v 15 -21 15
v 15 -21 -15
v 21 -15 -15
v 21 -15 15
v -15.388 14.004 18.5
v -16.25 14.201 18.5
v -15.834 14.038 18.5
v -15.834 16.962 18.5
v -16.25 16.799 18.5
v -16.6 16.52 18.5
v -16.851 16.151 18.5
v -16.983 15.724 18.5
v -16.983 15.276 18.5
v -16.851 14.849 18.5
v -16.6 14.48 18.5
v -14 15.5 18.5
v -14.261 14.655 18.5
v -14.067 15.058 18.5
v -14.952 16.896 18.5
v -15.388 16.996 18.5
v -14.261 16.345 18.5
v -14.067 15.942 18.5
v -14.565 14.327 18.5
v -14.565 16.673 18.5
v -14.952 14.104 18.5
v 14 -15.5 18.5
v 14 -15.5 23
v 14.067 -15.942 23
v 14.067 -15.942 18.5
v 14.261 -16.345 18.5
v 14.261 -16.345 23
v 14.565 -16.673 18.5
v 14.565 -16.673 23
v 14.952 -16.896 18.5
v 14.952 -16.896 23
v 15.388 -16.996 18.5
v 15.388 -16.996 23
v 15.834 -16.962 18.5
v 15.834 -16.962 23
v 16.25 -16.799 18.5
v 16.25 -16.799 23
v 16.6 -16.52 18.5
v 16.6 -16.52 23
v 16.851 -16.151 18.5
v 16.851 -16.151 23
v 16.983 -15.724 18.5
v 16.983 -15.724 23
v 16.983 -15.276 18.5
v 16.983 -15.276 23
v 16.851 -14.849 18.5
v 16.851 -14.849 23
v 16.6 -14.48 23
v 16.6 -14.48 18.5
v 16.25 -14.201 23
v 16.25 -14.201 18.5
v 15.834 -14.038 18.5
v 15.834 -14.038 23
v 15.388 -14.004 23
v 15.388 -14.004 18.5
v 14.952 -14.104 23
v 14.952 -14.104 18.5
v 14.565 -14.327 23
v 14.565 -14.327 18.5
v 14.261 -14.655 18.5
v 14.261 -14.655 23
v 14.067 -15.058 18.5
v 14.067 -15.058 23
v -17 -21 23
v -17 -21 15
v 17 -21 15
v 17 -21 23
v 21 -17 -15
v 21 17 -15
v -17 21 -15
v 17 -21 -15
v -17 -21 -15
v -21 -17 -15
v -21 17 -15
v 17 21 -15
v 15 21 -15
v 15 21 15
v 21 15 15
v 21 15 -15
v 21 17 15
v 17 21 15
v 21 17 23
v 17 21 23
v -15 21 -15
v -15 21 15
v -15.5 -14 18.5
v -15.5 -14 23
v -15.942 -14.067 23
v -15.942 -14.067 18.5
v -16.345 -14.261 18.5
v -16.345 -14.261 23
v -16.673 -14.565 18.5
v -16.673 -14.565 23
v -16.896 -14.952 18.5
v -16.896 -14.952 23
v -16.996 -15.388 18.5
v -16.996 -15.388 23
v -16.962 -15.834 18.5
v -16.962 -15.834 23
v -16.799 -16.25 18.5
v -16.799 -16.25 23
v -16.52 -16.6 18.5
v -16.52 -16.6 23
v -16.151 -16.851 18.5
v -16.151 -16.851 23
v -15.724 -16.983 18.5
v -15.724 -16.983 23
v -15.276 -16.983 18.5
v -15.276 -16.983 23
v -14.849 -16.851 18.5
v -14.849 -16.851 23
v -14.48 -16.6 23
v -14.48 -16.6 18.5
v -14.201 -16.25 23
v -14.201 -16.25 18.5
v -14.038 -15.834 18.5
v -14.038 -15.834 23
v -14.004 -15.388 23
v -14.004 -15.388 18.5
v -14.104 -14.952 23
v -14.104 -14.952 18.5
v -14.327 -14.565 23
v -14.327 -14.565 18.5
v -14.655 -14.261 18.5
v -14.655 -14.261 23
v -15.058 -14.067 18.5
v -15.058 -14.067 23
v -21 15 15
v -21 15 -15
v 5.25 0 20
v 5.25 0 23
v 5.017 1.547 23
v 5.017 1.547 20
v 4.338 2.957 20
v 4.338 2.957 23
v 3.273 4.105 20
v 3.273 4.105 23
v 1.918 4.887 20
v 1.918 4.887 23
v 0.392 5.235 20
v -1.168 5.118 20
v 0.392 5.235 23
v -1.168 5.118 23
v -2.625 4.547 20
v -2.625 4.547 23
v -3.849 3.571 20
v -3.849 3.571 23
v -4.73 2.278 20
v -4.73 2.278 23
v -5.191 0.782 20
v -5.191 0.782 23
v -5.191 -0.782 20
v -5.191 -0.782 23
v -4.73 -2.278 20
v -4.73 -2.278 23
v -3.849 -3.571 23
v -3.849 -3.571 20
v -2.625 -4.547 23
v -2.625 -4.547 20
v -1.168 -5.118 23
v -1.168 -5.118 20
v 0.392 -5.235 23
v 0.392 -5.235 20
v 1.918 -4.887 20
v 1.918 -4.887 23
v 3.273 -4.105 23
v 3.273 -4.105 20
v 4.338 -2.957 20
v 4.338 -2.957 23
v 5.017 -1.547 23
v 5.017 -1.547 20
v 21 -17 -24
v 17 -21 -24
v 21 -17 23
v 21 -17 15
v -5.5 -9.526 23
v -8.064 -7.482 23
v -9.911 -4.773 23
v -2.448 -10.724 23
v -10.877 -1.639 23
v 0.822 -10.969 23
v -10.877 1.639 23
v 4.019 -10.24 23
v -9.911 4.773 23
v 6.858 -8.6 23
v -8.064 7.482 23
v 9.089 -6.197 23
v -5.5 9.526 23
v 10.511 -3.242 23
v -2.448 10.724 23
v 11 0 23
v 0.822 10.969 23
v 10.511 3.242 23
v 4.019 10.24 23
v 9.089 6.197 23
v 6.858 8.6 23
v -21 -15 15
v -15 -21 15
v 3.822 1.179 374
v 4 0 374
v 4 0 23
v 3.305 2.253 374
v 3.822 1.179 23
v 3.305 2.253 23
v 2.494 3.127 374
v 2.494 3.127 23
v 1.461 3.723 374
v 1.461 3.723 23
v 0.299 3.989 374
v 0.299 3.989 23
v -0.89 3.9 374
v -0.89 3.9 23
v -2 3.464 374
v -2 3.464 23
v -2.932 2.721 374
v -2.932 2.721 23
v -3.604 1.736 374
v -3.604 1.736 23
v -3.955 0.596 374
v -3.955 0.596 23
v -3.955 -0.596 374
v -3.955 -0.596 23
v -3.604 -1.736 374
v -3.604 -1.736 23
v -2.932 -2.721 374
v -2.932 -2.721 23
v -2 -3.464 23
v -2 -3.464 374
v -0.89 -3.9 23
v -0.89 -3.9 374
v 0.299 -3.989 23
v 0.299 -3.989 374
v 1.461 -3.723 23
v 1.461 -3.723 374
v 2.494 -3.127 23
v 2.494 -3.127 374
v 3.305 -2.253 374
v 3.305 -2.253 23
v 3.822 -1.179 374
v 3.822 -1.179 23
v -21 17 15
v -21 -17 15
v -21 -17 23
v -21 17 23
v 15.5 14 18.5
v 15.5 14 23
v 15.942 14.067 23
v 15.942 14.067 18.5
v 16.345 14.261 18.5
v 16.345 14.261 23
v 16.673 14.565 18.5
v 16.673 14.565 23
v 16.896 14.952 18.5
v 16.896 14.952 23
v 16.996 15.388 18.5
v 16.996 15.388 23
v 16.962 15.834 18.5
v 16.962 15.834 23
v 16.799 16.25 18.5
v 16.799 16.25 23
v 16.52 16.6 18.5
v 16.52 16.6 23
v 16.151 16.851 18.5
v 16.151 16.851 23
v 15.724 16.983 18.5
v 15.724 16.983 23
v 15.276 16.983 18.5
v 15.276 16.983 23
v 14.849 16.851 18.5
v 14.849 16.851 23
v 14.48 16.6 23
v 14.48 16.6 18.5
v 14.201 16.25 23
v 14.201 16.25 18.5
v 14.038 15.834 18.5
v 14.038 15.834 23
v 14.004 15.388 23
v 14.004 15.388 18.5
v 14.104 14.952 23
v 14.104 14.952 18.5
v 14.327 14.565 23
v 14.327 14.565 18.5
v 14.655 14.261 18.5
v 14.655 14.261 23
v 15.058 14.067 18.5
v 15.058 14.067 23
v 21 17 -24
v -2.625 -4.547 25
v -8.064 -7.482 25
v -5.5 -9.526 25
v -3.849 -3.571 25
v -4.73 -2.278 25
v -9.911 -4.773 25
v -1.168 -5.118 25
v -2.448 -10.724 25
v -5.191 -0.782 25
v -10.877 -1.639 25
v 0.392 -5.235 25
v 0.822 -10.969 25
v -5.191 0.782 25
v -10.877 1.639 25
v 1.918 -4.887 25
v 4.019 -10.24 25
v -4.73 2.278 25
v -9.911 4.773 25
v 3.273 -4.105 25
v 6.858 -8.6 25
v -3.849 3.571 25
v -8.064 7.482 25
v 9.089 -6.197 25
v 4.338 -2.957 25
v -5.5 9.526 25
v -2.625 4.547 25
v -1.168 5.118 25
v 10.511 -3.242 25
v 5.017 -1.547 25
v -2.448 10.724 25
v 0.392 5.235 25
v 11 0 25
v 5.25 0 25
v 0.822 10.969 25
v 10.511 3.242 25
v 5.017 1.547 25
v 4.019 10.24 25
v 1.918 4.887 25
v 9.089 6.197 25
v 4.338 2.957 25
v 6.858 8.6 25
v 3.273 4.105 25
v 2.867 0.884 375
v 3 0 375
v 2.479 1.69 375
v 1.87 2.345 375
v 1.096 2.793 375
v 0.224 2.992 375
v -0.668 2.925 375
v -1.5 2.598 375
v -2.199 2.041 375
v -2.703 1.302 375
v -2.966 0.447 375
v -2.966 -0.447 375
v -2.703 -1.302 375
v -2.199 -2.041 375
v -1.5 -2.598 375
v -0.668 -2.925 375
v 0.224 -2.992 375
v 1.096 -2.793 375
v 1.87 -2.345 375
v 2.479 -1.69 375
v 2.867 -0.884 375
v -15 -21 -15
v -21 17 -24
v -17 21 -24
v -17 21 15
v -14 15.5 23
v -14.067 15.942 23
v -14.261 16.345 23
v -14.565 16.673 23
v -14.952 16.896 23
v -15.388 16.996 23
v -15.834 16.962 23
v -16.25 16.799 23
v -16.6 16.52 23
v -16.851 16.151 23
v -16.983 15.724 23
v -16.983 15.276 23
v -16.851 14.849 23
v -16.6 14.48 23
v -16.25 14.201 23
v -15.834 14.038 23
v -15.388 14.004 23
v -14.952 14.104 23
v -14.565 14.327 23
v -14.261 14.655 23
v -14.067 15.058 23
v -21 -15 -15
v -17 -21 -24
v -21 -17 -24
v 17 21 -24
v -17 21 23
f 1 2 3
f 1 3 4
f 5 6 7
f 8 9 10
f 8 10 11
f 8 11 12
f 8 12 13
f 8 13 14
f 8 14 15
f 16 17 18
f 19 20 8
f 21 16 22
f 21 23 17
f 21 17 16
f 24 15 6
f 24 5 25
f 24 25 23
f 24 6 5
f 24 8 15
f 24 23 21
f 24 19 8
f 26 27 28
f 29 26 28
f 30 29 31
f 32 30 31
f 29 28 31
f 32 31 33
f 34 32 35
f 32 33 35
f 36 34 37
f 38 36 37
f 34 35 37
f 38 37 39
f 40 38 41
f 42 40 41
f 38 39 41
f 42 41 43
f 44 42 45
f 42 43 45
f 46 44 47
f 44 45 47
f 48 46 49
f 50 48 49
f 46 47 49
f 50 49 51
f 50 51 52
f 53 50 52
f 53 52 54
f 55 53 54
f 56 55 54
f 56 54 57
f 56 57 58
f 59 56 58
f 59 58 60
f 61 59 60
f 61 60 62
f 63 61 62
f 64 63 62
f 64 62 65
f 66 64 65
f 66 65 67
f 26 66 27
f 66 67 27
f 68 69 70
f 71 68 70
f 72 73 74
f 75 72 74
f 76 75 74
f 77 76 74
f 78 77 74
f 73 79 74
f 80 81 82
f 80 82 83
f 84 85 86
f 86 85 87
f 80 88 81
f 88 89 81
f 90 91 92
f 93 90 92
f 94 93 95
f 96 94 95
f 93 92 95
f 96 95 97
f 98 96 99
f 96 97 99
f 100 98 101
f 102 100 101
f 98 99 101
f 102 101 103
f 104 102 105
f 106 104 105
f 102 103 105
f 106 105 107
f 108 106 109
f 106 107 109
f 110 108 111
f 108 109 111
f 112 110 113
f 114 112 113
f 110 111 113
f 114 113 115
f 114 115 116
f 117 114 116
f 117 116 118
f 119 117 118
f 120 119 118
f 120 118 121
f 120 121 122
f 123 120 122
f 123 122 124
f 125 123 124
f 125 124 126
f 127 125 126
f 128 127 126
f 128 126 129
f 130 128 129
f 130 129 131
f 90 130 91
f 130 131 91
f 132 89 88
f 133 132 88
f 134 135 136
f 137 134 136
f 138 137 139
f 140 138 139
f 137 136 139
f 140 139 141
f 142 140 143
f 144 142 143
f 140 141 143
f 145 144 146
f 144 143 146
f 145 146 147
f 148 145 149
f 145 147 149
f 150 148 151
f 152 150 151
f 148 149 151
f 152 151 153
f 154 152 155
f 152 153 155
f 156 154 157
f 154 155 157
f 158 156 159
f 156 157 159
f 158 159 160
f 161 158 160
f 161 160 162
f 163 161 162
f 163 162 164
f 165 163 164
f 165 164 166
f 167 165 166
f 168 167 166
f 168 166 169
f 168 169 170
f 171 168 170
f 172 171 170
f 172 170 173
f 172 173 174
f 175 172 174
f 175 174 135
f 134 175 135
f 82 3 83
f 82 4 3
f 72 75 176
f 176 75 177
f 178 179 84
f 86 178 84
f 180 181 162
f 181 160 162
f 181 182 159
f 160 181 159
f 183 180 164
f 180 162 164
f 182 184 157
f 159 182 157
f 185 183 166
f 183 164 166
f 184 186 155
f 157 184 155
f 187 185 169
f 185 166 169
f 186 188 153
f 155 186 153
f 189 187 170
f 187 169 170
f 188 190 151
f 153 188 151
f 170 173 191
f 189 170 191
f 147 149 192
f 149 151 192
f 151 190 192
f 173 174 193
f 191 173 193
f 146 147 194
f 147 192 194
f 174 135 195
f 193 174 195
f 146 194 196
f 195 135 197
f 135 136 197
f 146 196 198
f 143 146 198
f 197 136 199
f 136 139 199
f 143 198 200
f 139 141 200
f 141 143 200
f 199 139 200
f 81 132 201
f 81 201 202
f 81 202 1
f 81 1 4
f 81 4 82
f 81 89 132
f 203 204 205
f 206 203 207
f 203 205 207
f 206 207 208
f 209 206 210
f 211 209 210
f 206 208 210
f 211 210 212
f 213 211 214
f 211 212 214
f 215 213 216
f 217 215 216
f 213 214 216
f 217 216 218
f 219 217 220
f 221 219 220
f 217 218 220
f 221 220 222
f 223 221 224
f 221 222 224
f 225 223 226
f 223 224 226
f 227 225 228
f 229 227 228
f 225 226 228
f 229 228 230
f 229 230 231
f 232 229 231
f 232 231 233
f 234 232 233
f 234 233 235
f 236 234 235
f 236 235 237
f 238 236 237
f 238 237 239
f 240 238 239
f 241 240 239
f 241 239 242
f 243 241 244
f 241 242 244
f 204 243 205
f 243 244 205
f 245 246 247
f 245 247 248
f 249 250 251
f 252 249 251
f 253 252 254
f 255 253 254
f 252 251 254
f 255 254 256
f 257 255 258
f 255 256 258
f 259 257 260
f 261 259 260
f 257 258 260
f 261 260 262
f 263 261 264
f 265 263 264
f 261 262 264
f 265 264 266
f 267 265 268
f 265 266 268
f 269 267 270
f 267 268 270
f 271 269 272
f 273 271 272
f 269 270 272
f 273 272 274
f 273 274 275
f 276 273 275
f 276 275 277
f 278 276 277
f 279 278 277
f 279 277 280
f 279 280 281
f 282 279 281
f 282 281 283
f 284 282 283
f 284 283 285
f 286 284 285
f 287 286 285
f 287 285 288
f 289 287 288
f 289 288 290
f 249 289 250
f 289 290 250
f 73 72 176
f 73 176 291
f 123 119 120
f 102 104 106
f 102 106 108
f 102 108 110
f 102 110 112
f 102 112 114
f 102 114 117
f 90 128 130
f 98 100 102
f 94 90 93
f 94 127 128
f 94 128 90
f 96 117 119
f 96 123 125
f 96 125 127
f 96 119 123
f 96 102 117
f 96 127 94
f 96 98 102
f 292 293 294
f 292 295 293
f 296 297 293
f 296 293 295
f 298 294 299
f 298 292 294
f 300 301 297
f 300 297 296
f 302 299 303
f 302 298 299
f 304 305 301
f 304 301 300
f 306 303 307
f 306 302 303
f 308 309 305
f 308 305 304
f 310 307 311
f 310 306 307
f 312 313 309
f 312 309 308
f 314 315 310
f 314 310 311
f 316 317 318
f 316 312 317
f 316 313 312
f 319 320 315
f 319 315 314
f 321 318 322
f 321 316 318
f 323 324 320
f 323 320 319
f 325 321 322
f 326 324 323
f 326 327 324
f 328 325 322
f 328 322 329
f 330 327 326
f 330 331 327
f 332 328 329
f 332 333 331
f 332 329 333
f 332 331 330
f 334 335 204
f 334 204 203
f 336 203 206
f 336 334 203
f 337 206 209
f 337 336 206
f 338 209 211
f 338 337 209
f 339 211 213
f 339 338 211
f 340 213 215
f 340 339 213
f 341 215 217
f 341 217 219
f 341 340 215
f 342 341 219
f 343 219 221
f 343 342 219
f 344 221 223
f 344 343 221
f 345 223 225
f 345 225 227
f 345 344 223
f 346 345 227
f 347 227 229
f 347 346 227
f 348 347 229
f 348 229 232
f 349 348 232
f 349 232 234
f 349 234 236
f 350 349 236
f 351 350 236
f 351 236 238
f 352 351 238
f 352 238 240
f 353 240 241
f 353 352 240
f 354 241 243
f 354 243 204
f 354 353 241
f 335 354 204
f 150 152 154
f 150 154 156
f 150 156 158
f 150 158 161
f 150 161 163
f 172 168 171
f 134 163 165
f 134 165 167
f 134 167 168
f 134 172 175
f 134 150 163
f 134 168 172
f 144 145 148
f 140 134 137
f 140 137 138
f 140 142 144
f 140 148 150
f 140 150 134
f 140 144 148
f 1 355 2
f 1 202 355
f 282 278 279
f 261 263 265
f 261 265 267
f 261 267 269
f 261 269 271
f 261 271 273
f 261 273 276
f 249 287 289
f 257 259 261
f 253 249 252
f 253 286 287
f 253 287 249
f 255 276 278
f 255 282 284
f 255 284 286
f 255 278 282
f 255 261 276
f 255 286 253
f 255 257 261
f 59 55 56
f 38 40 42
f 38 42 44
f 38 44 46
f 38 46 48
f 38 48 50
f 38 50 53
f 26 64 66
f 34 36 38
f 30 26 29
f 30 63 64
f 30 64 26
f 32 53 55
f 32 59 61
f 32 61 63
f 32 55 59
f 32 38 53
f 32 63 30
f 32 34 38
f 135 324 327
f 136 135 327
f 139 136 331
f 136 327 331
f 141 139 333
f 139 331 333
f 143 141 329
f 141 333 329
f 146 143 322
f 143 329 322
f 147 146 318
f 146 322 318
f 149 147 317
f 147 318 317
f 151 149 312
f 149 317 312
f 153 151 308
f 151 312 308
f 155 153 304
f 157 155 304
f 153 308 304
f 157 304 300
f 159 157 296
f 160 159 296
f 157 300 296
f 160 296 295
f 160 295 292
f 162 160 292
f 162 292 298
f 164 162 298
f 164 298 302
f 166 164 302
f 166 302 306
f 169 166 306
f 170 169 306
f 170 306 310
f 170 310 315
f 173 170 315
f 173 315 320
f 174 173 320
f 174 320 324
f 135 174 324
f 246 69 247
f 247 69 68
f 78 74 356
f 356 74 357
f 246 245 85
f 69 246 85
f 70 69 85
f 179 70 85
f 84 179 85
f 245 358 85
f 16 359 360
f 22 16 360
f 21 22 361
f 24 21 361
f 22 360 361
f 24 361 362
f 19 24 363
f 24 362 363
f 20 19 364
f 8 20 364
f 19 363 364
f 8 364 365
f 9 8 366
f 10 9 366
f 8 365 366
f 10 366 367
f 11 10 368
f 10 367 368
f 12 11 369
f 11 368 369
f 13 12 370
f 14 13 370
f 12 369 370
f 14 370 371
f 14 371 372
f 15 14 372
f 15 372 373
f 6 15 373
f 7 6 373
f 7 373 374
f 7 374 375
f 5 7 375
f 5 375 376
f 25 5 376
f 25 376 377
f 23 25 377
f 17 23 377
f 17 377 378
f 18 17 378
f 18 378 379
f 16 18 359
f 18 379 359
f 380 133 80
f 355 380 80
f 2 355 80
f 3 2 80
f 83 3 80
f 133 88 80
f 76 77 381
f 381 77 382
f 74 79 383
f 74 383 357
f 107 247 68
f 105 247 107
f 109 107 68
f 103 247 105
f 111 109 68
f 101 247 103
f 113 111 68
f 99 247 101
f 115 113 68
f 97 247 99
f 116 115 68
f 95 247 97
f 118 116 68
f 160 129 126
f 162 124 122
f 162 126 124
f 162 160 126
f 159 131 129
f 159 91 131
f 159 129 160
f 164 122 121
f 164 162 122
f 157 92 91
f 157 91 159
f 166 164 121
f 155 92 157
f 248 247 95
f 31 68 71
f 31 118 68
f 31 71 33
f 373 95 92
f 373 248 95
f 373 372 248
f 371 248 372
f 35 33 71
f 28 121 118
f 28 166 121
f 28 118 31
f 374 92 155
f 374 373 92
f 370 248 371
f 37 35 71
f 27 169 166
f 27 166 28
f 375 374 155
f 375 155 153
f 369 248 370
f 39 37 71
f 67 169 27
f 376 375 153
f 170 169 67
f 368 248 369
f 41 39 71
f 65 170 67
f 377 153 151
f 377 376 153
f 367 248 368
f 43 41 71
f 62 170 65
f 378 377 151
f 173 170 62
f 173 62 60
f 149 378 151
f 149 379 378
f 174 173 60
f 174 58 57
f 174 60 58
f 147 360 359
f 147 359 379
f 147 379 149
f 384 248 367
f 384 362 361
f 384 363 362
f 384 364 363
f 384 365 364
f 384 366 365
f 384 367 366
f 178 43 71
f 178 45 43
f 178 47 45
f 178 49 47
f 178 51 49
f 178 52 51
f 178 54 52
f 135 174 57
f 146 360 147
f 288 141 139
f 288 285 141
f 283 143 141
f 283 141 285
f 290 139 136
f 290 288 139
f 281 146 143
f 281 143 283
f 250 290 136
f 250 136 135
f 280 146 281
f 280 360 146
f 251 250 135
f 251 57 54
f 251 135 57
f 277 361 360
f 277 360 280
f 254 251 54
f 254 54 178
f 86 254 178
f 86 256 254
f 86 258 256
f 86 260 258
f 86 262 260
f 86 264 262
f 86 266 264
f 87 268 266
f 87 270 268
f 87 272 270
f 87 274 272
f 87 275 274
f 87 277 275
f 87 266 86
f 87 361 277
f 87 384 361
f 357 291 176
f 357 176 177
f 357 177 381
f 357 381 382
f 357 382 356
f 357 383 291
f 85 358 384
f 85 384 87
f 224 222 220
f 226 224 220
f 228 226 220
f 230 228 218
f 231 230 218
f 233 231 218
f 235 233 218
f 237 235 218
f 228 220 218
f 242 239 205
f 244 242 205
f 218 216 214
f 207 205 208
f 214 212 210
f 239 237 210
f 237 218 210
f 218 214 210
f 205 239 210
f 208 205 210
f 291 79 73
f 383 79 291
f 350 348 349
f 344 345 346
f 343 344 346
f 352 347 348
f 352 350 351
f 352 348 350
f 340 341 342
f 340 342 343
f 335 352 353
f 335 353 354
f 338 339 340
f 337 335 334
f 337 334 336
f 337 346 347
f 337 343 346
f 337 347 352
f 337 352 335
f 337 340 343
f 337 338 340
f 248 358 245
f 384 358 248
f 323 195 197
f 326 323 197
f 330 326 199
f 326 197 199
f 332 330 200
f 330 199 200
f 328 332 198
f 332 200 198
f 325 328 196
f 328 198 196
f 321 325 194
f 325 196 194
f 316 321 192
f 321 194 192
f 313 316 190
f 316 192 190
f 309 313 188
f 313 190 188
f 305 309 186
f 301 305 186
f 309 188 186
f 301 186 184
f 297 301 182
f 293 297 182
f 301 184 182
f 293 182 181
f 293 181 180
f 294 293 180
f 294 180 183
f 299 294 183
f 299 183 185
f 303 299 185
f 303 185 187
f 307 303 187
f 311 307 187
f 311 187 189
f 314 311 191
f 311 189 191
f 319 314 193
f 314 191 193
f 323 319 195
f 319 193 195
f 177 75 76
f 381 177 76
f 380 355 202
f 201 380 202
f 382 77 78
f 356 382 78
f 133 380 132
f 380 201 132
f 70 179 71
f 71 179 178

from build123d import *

# Parameters (mm, degrees)
SKETCH_1_W               = 42
SKETCH_1_H               = 42
EXTRUDE_1_DEPTH          = 15
CHAMFER_1_SIZE           = 6
SKETCH_15_W              = 42
SKETCH_15_H              = 42
EXTRUDE_11_DEPTH         = 8
SKETCH_16_W              = 42
SKETCH_16_H              = 42
EXTRUDE_12_DEPTH         = 9
CHAMFER_2_SIZE           = 4
CHAMFER_3_SIZE           = 4
SKETCH_2_R               = 11
EXTRUDE_2_DEPTH          = 2
SKETCH_3_R               = 5.25
CUT_EXTRUDE_1_DEPTH      = 5
SKETCH_6_R               = 4
EXTRUDE_9_DEPTH          = 352
SKETCH_8_R               = 1.5
CUT_EXTRUDE_3_DEPTH      = 4.5
PATTERN_CIRCULAR_1_COUNT = 4
CHAMFER_4_SIZE           = 1


with BuildPart() as part:
    # 草圖1 → 填料-伸長1 (new body, symmetric)
    with BuildSketch(Plane.XY):
        Rectangle(SKETCH_1_W, SKETCH_1_H)
    extrude(amount=EXTRUDE_1_DEPTH, both=True)

    # 導角1
    chamfer_1_edges = [part.edges().sort_by_distance(p)[0] for p in [
        (21, -21, 0),
        (-21, -21, 0),
        (-21, 21, 0),
        (21, 21, 0),
    ]]
    chamfer(chamfer_1_edges, length=CHAMFER_1_SIZE)


with BuildPart() as body_2:
    # 草圖15 → 填料-伸長11 (new body)
    with BuildSketch(Plane.XY.offset(15)):
        Rectangle(SKETCH_15_W, SKETCH_15_H)
    extrude(amount=EXTRUDE_11_DEPTH)

    # 導角2
    chamfer_2_edges = [body_2.edges().sort_by_distance(p)[0] for p in [
        (21, -21, 19),
        (-21, -21, 19),
        (-21, 21, 19),
        (21, 21, 19),
    ]]
    chamfer(chamfer_2_edges, length=CHAMFER_2_SIZE)


with BuildPart() as body_3:
    # 草圖16 → 填料-伸長12 (new body)
    with BuildSketch(Plane(origin=(0, 0, -15), x_dir=(-1, 0, 0), z_dir=(0, 0, -1))):
        Rectangle(SKETCH_16_W, SKETCH_16_H)
    extrude(amount=EXTRUDE_12_DEPTH)

    # 導角3
    chamfer_3_edges = [body_3.edges().sort_by_distance(p)[0] for p in [
        (-21, -21, -19.5),
        (21, -21, -19.5),
        (21, 21, -19.5),
        (-21, 21, -19.5),
    ]]
    chamfer(chamfer_3_edges, length=CHAMFER_3_SIZE)


with BuildPart() as body_4:
    # 草圖2 → 填料-伸長2 (new body)
    with BuildSketch(Plane.XY.offset(23)):
        Circle(SKETCH_2_R)
    extrude(amount=EXTRUDE_2_DEPTH)


with BuildPart() as cut_extrude_1_tool:
    # 草圖3 → 除料-伸長1 (new body)
    with BuildSketch(Plane.XY.offset(25)):
        Circle(SKETCH_3_R)
    extrude(amount=-CUT_EXTRUDE_1_DEPTH)


with BuildPart() as body_2_1:
    add(body_2.part)

    # 除料-伸長1: cut by cut_extrude_1_tool
    add(cut_extrude_1_tool.part, mode=Mode.SUBTRACT)

    # 草圖8 → 除料-伸長3 (cut)
    with BuildSketch(Plane.XY.offset(23)):
        with Locations((-15.5, 15.5)):
            Circle(SKETCH_8_R)
    cut_extrude_3 = extrude(amount=-CUT_EXTRUDE_3_DEPTH, mode=Mode.SUBTRACT)

    # 環狀複製排列1: 除料-伸長3 ×4 about axis
    pattern_circular_1_axis = Axis((0, 0, 0), (0, 0, 1))
    for i in range(1, PATTERN_CIRCULAR_1_COUNT):
        add(cut_extrude_3.rotate(pattern_circular_1_axis, i * 360 / PATTERN_CIRCULAR_1_COUNT), mode=Mode.SUBTRACT)


with BuildPart() as body_4_1:
    add(body_4.part)

    # 除料-伸長1: cut by cut_extrude_1_tool
    add(cut_extrude_1_tool.part, mode=Mode.SUBTRACT)


with BuildPart() as body_5:
    # 草圖6 → 填料-伸長9 (new body)
    with BuildSketch(Plane.XY.offset(23)):
        Circle(SKETCH_6_R)
    extrude(amount=EXTRUDE_9_DEPTH)

    # 導角4
    chamfer_4_edges = [body_5.edges().sort_by_distance(p)[0] for p in [
        (-4, 0, 375),
    ]]
    chamfer(chamfer_4_edges, length=CHAMFER_4_SIZE)


solid = Compound([part.part, body_3.part, body_2_1.part, body_4_1.part, body_5.part])
